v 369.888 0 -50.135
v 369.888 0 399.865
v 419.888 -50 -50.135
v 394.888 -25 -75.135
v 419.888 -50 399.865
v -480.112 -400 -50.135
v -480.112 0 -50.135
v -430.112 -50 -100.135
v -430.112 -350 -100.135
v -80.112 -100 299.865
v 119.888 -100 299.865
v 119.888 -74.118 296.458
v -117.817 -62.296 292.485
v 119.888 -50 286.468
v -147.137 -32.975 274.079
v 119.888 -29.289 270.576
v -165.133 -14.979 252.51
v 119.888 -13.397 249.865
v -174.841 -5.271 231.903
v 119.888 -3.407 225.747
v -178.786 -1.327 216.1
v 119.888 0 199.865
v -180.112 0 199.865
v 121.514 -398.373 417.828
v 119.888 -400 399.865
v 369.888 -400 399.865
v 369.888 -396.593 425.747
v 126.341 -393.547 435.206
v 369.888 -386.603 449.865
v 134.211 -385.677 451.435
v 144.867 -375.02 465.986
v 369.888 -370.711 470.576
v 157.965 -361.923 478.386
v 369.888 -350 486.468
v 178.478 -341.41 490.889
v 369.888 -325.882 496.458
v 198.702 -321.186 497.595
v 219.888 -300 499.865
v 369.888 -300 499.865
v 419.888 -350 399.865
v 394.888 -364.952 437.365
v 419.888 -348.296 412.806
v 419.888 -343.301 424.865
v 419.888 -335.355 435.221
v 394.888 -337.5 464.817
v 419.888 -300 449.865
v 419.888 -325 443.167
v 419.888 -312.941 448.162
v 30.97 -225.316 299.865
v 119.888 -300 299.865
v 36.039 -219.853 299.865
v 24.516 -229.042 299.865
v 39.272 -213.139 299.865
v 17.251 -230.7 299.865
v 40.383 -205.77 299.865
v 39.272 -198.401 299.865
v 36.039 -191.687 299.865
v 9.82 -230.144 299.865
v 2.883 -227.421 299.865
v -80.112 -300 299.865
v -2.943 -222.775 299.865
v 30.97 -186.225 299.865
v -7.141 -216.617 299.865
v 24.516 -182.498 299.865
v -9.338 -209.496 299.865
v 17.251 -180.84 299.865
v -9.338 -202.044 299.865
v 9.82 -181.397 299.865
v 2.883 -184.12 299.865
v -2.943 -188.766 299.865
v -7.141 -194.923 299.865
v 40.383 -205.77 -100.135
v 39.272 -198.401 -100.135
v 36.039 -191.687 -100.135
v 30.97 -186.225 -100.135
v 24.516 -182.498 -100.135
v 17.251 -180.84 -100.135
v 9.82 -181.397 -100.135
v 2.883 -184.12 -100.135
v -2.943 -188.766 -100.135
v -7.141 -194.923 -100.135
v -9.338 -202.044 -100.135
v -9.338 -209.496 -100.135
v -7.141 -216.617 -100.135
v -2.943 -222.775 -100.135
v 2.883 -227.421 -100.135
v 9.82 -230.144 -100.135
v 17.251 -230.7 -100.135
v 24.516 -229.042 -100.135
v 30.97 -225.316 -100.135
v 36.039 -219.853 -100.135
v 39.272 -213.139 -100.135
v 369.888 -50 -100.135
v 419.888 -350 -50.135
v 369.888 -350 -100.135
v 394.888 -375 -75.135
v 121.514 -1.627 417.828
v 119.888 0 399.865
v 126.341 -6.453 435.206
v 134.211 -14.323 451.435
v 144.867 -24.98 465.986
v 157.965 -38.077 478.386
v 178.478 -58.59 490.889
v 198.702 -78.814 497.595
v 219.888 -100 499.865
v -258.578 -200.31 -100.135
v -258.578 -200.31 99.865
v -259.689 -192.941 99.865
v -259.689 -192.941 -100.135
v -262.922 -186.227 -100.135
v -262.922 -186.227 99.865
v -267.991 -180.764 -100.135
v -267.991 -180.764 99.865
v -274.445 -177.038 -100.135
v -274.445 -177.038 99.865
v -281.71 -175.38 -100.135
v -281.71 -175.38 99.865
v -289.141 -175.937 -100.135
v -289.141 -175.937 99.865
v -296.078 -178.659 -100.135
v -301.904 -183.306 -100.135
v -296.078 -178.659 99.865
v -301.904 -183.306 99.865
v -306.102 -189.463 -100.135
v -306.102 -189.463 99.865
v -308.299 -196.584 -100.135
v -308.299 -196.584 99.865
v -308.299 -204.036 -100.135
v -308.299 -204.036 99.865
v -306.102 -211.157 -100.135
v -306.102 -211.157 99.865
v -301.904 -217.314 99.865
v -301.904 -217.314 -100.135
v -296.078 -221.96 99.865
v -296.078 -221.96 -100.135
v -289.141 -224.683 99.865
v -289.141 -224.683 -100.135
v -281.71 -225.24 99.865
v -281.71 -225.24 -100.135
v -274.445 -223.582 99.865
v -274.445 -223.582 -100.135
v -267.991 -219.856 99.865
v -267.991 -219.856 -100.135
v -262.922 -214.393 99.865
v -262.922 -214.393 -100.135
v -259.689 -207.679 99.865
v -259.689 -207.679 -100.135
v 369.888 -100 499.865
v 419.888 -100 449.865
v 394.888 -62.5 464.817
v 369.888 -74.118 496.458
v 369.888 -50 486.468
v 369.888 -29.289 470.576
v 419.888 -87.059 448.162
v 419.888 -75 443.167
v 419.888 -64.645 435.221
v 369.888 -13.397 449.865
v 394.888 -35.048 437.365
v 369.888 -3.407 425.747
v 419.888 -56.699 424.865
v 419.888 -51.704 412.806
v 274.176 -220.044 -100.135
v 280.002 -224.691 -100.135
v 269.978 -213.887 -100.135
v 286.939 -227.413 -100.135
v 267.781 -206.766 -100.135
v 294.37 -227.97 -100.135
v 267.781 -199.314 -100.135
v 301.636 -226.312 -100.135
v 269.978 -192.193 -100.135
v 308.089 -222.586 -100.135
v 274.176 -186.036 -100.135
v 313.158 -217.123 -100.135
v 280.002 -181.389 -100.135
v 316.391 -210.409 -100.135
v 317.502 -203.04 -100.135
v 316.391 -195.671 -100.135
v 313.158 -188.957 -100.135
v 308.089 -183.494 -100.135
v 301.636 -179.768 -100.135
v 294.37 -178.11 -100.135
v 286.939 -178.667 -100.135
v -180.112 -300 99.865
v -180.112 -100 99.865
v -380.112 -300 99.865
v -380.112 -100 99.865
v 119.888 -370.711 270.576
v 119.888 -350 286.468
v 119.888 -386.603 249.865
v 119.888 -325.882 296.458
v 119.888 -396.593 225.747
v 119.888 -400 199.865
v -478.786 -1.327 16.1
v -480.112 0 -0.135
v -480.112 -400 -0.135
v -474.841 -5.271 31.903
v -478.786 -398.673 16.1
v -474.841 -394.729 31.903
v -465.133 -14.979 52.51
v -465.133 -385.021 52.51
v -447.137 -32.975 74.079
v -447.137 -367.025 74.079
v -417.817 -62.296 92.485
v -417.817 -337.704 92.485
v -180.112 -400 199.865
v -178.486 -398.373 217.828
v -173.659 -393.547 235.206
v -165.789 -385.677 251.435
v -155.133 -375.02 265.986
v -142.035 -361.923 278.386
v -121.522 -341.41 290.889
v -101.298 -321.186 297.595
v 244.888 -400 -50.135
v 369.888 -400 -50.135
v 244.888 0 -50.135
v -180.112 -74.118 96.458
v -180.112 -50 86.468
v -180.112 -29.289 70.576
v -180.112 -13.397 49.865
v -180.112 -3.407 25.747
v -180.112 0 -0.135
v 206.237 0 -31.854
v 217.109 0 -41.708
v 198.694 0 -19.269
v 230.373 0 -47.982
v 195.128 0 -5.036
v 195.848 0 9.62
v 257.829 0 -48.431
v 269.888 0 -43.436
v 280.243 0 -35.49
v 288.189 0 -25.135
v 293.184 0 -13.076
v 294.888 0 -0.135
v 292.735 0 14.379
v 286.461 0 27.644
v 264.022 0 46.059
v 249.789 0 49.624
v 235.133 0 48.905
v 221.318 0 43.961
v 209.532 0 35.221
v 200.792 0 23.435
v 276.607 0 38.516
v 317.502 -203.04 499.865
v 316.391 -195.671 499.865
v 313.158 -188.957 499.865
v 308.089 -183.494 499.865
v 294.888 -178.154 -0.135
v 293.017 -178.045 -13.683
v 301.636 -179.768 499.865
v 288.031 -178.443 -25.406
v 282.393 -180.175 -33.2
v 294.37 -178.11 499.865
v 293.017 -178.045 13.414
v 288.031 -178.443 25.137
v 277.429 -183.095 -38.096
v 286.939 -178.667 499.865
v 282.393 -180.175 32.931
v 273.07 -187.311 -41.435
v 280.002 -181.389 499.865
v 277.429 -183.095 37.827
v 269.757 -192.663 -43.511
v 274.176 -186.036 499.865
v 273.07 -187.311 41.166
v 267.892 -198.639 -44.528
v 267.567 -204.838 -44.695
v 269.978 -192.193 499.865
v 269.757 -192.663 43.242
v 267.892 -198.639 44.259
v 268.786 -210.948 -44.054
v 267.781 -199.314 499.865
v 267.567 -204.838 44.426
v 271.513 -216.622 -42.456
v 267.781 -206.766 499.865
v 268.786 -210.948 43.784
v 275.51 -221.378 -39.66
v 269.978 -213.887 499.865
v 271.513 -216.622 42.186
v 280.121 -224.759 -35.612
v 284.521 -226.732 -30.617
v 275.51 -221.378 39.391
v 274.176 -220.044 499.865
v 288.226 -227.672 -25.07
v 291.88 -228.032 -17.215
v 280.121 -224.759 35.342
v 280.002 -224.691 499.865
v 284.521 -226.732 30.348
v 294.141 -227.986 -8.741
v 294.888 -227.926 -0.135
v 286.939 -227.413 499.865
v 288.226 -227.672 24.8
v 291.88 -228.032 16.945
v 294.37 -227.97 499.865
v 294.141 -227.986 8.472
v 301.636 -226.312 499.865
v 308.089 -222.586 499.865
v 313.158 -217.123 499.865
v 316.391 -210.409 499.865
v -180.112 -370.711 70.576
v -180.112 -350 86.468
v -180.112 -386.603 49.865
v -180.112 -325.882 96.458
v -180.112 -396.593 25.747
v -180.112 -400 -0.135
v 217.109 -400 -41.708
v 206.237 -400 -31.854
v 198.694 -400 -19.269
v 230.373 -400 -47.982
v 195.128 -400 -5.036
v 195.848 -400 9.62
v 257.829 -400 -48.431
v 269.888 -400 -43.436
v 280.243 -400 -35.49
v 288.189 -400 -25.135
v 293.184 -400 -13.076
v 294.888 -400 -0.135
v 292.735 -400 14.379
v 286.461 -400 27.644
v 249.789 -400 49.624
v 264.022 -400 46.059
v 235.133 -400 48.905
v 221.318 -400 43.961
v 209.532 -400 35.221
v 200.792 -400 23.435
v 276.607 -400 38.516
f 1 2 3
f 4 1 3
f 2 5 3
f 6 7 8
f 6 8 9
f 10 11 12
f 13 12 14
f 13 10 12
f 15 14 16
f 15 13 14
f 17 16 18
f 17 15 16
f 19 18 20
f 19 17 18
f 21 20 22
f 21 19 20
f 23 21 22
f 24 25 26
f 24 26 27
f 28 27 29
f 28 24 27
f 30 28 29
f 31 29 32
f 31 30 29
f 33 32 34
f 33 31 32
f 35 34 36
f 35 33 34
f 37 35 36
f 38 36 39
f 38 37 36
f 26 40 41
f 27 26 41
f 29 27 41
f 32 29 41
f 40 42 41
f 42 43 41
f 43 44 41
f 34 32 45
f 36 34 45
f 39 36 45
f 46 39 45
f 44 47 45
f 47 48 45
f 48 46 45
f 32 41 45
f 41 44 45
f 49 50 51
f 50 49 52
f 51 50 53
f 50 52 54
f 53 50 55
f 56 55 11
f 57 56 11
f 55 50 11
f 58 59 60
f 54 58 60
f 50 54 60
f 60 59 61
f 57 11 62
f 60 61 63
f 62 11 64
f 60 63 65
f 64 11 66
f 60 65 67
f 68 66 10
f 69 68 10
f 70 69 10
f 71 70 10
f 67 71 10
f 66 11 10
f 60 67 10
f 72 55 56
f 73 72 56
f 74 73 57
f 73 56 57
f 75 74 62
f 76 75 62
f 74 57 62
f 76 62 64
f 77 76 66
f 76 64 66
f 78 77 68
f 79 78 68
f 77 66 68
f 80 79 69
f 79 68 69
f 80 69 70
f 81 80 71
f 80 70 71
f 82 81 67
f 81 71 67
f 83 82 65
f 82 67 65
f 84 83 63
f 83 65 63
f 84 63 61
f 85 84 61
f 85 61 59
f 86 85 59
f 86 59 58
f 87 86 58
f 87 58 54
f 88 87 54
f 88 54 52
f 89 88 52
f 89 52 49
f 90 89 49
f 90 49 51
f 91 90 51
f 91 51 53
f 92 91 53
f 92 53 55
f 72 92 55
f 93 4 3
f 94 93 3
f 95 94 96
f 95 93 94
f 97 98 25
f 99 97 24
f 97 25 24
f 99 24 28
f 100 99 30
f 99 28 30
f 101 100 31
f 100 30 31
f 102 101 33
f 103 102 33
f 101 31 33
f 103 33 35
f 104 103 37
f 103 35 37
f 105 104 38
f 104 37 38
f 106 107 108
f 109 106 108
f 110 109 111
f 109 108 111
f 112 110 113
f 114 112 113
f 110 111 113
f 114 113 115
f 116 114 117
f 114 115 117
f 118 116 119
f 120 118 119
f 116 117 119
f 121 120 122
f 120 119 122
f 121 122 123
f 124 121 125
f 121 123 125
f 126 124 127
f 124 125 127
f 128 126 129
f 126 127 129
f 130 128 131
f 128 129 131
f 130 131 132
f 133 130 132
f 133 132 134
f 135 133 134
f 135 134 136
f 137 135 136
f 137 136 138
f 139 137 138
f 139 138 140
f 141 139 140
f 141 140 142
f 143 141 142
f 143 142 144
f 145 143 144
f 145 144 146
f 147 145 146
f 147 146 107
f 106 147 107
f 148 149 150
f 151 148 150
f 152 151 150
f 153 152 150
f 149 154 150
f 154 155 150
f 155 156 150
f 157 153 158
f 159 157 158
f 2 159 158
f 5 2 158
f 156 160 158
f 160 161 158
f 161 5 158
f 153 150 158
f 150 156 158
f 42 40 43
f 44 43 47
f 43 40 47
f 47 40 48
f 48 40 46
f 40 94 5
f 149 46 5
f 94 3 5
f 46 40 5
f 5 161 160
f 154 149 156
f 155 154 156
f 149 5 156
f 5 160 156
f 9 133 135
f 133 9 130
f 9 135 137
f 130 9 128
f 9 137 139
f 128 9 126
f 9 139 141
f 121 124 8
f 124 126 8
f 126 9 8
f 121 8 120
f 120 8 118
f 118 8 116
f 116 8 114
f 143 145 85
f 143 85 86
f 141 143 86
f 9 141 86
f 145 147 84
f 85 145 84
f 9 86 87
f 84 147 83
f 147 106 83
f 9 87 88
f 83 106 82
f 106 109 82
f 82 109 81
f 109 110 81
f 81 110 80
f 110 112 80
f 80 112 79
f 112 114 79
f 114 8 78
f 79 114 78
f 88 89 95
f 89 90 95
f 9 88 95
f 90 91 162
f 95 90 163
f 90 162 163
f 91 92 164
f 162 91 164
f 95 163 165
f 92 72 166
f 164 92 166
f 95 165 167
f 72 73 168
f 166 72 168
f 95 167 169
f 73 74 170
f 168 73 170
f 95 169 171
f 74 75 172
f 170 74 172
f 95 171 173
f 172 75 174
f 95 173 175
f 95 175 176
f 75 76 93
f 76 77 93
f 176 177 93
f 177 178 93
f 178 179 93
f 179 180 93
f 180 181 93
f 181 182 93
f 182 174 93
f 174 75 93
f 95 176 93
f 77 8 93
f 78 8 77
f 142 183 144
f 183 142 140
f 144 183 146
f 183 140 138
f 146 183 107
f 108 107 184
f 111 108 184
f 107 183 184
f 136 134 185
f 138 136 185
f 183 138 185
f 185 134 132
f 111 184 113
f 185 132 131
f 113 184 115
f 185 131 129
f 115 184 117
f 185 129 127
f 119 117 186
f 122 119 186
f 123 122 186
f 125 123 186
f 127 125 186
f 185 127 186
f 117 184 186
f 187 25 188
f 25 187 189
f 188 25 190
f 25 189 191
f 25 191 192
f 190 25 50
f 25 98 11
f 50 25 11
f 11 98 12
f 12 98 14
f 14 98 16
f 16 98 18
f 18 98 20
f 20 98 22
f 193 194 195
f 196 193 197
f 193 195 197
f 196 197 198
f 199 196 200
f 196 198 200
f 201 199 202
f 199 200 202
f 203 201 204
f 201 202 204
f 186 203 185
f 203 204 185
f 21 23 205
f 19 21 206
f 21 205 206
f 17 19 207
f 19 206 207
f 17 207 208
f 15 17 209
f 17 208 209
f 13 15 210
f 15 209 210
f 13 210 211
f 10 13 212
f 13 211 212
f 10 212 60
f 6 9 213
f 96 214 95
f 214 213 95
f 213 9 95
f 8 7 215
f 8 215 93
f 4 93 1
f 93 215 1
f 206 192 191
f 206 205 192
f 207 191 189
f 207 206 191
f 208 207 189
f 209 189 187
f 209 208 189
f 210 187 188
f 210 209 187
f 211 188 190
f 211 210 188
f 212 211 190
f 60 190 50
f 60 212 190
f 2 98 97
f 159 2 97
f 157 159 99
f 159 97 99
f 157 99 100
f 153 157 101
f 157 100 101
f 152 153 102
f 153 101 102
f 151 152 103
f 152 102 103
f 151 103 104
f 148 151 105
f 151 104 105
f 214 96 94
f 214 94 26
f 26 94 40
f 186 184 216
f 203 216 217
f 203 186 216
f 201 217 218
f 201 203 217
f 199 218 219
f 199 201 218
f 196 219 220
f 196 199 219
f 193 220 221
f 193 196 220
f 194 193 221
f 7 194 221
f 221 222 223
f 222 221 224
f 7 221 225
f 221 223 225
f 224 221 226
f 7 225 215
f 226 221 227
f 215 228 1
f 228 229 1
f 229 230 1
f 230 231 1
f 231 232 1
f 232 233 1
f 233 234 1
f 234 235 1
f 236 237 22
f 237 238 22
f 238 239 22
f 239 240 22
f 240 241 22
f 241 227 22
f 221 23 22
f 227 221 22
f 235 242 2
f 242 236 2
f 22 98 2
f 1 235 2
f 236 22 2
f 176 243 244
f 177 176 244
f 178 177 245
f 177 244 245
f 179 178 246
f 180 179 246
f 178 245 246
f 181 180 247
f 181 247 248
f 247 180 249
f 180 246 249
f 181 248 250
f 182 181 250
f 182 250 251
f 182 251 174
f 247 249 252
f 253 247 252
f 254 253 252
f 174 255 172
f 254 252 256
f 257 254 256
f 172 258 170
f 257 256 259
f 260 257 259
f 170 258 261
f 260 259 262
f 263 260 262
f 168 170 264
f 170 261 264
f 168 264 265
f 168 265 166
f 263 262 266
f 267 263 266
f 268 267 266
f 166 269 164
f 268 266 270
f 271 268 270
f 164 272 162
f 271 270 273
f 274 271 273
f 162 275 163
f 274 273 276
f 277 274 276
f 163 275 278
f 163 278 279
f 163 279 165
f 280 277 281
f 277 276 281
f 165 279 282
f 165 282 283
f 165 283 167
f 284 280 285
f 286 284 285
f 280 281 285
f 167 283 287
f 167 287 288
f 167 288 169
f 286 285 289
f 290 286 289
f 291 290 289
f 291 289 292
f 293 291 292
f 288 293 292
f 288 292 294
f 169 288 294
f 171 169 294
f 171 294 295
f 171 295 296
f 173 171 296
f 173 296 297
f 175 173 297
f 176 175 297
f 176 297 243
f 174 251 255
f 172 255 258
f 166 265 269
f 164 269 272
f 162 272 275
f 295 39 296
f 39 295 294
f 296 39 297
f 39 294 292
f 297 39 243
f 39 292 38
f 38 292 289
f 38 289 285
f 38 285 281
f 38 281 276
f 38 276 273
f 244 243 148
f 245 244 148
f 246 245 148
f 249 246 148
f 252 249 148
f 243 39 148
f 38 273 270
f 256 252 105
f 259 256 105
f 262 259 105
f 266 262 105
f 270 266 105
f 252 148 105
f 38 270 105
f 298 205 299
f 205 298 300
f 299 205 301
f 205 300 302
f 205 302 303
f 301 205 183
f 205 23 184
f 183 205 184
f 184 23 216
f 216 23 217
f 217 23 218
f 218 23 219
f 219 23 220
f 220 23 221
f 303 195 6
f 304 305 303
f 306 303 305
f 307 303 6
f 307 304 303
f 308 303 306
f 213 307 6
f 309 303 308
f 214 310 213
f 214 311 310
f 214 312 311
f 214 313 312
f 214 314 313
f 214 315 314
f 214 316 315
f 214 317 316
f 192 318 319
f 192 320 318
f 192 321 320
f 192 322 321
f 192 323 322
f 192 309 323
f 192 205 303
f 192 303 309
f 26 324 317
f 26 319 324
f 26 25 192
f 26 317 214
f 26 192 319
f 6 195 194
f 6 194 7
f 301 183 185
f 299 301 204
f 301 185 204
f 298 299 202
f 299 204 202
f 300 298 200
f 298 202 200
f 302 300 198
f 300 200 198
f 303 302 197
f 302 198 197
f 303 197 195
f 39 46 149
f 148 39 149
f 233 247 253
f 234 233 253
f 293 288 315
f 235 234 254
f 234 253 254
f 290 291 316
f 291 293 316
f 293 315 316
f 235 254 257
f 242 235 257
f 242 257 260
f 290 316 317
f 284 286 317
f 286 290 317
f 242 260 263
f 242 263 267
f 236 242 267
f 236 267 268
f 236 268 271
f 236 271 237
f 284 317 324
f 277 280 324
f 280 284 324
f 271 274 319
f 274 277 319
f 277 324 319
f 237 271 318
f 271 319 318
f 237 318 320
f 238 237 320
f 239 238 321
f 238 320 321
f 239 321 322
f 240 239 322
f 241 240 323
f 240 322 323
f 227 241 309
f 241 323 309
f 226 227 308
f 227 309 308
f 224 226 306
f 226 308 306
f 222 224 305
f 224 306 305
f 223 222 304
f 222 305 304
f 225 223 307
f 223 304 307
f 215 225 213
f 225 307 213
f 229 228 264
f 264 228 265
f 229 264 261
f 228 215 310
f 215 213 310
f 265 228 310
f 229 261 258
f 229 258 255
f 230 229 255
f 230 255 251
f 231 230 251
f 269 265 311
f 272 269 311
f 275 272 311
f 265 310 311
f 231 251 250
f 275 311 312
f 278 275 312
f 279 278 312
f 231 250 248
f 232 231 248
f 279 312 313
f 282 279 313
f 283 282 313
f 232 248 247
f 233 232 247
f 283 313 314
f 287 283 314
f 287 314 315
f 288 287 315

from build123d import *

# Parameters (mm, degrees)
F1_DEPTH  = 400
F2_R      = 100
F3_R      = 100
F4_R      = 100
F5_SIZE   = 50
F6_SIZE   = 50
F7_R      = 50
F8_DEPTH  = 25.4
F8_FACE_R = 50
F9_DEPTH  = 425.401
F10_R     = 25
F11_DEPTH = 600.001


with BuildPart() as f1:
    # F0 (on Front) → F1 (new body)
    with BuildSketch(Plane.XZ):
        Polygon((-480.112339, 99.865262), (-480.112339, -100.134738), (419.887661, -100.134738), (419.887661, 499.865262), (119.887661, 499.865262), (119.887661, 299.865262), (-180.112339, 299.865262), (-180.112339, 99.865262), align=None)
    extrude(amount=F1_DEPTH)

    # F2
    f2_edges = [f1.edges().sort_by_distance(p)[0] for p in [
        (-330.112339, 0, 99.865262),
        (-330.112339, -400, 99.865262),
        (-480.112339, -200, 99.865262),
    ]]
    fillet(f2_edges, radius=F2_R)

    # F3
    f3_edges = [f1.edges().sort_by_distance(p)[0] for p in [
        (-30.112339, 0, 299.865262),
        (-180.112339, -200, 299.865262),
        (-30.112339, -400, 299.865262),
    ]]
    fillet(f3_edges, radius=F3_R)

    # F4
    f4_edges = [f1.edges().sort_by_distance(p)[0] for p in [
        (269.887661, 0, 499.865262),
        (119.887661, -200, 499.865262),
        (269.887661, -400, 499.865262),
    ]]
    fillet(f4_edges, radius=F4_R)

    # F5
    f5_edges = [f1.edges().sort_by_distance(p)[0] for p in [
        (419.887661, -400, 149.865262),
        (419.887661, -200, -100.134738),
    ]]
    chamfer(f5_edges, length=F5_SIZE)

    # F6
    f6_edges = [f1.edges().sort_by_distance(p)[0] for p in [
        (-55.112339, -400, -100.134738),
        (-480.112339, -200, -100.134738),
        (-55.112339, 0, -100.134738),
    ]]
    chamfer(f6_edges, length=F6_SIZE)

    # F7 (on face) → F8 (join)
    with BuildSketch(Plane.XZ.offset(400)):
        with Locations((244.887661, -0.134738)):
            Circle(F7_R)
    extrude(amount=F8_DEPTH)

    # F8_face (on face) → F9 (cut, through all)
    with BuildSketch(Plane(origin=(244.887661, -425.4, -0.134738), x_dir=(1, 0, 0), z_dir=(0, -1, 0))):
        Circle(F8_FACE_R)
    extrude(amount=-F9_DEPTH, mode=Mode.SUBTRACT)

    # F10 (on face) → F11 (cut, through all)
    with BuildSketch(Plane.XY.offset(499.865262)):
        with Locations((292.502016, -203.040093)):
            Circle(F10_R)
        with Locations((15.382883, -205.770329)):
            Circle(F10_R)
        with Locations((-283.578157, -200.309843)):
            Circle(F10_R)
    extrude(amount=-F11_DEPTH, mode=Mode.SUBTRACT)


solid = f1.part
